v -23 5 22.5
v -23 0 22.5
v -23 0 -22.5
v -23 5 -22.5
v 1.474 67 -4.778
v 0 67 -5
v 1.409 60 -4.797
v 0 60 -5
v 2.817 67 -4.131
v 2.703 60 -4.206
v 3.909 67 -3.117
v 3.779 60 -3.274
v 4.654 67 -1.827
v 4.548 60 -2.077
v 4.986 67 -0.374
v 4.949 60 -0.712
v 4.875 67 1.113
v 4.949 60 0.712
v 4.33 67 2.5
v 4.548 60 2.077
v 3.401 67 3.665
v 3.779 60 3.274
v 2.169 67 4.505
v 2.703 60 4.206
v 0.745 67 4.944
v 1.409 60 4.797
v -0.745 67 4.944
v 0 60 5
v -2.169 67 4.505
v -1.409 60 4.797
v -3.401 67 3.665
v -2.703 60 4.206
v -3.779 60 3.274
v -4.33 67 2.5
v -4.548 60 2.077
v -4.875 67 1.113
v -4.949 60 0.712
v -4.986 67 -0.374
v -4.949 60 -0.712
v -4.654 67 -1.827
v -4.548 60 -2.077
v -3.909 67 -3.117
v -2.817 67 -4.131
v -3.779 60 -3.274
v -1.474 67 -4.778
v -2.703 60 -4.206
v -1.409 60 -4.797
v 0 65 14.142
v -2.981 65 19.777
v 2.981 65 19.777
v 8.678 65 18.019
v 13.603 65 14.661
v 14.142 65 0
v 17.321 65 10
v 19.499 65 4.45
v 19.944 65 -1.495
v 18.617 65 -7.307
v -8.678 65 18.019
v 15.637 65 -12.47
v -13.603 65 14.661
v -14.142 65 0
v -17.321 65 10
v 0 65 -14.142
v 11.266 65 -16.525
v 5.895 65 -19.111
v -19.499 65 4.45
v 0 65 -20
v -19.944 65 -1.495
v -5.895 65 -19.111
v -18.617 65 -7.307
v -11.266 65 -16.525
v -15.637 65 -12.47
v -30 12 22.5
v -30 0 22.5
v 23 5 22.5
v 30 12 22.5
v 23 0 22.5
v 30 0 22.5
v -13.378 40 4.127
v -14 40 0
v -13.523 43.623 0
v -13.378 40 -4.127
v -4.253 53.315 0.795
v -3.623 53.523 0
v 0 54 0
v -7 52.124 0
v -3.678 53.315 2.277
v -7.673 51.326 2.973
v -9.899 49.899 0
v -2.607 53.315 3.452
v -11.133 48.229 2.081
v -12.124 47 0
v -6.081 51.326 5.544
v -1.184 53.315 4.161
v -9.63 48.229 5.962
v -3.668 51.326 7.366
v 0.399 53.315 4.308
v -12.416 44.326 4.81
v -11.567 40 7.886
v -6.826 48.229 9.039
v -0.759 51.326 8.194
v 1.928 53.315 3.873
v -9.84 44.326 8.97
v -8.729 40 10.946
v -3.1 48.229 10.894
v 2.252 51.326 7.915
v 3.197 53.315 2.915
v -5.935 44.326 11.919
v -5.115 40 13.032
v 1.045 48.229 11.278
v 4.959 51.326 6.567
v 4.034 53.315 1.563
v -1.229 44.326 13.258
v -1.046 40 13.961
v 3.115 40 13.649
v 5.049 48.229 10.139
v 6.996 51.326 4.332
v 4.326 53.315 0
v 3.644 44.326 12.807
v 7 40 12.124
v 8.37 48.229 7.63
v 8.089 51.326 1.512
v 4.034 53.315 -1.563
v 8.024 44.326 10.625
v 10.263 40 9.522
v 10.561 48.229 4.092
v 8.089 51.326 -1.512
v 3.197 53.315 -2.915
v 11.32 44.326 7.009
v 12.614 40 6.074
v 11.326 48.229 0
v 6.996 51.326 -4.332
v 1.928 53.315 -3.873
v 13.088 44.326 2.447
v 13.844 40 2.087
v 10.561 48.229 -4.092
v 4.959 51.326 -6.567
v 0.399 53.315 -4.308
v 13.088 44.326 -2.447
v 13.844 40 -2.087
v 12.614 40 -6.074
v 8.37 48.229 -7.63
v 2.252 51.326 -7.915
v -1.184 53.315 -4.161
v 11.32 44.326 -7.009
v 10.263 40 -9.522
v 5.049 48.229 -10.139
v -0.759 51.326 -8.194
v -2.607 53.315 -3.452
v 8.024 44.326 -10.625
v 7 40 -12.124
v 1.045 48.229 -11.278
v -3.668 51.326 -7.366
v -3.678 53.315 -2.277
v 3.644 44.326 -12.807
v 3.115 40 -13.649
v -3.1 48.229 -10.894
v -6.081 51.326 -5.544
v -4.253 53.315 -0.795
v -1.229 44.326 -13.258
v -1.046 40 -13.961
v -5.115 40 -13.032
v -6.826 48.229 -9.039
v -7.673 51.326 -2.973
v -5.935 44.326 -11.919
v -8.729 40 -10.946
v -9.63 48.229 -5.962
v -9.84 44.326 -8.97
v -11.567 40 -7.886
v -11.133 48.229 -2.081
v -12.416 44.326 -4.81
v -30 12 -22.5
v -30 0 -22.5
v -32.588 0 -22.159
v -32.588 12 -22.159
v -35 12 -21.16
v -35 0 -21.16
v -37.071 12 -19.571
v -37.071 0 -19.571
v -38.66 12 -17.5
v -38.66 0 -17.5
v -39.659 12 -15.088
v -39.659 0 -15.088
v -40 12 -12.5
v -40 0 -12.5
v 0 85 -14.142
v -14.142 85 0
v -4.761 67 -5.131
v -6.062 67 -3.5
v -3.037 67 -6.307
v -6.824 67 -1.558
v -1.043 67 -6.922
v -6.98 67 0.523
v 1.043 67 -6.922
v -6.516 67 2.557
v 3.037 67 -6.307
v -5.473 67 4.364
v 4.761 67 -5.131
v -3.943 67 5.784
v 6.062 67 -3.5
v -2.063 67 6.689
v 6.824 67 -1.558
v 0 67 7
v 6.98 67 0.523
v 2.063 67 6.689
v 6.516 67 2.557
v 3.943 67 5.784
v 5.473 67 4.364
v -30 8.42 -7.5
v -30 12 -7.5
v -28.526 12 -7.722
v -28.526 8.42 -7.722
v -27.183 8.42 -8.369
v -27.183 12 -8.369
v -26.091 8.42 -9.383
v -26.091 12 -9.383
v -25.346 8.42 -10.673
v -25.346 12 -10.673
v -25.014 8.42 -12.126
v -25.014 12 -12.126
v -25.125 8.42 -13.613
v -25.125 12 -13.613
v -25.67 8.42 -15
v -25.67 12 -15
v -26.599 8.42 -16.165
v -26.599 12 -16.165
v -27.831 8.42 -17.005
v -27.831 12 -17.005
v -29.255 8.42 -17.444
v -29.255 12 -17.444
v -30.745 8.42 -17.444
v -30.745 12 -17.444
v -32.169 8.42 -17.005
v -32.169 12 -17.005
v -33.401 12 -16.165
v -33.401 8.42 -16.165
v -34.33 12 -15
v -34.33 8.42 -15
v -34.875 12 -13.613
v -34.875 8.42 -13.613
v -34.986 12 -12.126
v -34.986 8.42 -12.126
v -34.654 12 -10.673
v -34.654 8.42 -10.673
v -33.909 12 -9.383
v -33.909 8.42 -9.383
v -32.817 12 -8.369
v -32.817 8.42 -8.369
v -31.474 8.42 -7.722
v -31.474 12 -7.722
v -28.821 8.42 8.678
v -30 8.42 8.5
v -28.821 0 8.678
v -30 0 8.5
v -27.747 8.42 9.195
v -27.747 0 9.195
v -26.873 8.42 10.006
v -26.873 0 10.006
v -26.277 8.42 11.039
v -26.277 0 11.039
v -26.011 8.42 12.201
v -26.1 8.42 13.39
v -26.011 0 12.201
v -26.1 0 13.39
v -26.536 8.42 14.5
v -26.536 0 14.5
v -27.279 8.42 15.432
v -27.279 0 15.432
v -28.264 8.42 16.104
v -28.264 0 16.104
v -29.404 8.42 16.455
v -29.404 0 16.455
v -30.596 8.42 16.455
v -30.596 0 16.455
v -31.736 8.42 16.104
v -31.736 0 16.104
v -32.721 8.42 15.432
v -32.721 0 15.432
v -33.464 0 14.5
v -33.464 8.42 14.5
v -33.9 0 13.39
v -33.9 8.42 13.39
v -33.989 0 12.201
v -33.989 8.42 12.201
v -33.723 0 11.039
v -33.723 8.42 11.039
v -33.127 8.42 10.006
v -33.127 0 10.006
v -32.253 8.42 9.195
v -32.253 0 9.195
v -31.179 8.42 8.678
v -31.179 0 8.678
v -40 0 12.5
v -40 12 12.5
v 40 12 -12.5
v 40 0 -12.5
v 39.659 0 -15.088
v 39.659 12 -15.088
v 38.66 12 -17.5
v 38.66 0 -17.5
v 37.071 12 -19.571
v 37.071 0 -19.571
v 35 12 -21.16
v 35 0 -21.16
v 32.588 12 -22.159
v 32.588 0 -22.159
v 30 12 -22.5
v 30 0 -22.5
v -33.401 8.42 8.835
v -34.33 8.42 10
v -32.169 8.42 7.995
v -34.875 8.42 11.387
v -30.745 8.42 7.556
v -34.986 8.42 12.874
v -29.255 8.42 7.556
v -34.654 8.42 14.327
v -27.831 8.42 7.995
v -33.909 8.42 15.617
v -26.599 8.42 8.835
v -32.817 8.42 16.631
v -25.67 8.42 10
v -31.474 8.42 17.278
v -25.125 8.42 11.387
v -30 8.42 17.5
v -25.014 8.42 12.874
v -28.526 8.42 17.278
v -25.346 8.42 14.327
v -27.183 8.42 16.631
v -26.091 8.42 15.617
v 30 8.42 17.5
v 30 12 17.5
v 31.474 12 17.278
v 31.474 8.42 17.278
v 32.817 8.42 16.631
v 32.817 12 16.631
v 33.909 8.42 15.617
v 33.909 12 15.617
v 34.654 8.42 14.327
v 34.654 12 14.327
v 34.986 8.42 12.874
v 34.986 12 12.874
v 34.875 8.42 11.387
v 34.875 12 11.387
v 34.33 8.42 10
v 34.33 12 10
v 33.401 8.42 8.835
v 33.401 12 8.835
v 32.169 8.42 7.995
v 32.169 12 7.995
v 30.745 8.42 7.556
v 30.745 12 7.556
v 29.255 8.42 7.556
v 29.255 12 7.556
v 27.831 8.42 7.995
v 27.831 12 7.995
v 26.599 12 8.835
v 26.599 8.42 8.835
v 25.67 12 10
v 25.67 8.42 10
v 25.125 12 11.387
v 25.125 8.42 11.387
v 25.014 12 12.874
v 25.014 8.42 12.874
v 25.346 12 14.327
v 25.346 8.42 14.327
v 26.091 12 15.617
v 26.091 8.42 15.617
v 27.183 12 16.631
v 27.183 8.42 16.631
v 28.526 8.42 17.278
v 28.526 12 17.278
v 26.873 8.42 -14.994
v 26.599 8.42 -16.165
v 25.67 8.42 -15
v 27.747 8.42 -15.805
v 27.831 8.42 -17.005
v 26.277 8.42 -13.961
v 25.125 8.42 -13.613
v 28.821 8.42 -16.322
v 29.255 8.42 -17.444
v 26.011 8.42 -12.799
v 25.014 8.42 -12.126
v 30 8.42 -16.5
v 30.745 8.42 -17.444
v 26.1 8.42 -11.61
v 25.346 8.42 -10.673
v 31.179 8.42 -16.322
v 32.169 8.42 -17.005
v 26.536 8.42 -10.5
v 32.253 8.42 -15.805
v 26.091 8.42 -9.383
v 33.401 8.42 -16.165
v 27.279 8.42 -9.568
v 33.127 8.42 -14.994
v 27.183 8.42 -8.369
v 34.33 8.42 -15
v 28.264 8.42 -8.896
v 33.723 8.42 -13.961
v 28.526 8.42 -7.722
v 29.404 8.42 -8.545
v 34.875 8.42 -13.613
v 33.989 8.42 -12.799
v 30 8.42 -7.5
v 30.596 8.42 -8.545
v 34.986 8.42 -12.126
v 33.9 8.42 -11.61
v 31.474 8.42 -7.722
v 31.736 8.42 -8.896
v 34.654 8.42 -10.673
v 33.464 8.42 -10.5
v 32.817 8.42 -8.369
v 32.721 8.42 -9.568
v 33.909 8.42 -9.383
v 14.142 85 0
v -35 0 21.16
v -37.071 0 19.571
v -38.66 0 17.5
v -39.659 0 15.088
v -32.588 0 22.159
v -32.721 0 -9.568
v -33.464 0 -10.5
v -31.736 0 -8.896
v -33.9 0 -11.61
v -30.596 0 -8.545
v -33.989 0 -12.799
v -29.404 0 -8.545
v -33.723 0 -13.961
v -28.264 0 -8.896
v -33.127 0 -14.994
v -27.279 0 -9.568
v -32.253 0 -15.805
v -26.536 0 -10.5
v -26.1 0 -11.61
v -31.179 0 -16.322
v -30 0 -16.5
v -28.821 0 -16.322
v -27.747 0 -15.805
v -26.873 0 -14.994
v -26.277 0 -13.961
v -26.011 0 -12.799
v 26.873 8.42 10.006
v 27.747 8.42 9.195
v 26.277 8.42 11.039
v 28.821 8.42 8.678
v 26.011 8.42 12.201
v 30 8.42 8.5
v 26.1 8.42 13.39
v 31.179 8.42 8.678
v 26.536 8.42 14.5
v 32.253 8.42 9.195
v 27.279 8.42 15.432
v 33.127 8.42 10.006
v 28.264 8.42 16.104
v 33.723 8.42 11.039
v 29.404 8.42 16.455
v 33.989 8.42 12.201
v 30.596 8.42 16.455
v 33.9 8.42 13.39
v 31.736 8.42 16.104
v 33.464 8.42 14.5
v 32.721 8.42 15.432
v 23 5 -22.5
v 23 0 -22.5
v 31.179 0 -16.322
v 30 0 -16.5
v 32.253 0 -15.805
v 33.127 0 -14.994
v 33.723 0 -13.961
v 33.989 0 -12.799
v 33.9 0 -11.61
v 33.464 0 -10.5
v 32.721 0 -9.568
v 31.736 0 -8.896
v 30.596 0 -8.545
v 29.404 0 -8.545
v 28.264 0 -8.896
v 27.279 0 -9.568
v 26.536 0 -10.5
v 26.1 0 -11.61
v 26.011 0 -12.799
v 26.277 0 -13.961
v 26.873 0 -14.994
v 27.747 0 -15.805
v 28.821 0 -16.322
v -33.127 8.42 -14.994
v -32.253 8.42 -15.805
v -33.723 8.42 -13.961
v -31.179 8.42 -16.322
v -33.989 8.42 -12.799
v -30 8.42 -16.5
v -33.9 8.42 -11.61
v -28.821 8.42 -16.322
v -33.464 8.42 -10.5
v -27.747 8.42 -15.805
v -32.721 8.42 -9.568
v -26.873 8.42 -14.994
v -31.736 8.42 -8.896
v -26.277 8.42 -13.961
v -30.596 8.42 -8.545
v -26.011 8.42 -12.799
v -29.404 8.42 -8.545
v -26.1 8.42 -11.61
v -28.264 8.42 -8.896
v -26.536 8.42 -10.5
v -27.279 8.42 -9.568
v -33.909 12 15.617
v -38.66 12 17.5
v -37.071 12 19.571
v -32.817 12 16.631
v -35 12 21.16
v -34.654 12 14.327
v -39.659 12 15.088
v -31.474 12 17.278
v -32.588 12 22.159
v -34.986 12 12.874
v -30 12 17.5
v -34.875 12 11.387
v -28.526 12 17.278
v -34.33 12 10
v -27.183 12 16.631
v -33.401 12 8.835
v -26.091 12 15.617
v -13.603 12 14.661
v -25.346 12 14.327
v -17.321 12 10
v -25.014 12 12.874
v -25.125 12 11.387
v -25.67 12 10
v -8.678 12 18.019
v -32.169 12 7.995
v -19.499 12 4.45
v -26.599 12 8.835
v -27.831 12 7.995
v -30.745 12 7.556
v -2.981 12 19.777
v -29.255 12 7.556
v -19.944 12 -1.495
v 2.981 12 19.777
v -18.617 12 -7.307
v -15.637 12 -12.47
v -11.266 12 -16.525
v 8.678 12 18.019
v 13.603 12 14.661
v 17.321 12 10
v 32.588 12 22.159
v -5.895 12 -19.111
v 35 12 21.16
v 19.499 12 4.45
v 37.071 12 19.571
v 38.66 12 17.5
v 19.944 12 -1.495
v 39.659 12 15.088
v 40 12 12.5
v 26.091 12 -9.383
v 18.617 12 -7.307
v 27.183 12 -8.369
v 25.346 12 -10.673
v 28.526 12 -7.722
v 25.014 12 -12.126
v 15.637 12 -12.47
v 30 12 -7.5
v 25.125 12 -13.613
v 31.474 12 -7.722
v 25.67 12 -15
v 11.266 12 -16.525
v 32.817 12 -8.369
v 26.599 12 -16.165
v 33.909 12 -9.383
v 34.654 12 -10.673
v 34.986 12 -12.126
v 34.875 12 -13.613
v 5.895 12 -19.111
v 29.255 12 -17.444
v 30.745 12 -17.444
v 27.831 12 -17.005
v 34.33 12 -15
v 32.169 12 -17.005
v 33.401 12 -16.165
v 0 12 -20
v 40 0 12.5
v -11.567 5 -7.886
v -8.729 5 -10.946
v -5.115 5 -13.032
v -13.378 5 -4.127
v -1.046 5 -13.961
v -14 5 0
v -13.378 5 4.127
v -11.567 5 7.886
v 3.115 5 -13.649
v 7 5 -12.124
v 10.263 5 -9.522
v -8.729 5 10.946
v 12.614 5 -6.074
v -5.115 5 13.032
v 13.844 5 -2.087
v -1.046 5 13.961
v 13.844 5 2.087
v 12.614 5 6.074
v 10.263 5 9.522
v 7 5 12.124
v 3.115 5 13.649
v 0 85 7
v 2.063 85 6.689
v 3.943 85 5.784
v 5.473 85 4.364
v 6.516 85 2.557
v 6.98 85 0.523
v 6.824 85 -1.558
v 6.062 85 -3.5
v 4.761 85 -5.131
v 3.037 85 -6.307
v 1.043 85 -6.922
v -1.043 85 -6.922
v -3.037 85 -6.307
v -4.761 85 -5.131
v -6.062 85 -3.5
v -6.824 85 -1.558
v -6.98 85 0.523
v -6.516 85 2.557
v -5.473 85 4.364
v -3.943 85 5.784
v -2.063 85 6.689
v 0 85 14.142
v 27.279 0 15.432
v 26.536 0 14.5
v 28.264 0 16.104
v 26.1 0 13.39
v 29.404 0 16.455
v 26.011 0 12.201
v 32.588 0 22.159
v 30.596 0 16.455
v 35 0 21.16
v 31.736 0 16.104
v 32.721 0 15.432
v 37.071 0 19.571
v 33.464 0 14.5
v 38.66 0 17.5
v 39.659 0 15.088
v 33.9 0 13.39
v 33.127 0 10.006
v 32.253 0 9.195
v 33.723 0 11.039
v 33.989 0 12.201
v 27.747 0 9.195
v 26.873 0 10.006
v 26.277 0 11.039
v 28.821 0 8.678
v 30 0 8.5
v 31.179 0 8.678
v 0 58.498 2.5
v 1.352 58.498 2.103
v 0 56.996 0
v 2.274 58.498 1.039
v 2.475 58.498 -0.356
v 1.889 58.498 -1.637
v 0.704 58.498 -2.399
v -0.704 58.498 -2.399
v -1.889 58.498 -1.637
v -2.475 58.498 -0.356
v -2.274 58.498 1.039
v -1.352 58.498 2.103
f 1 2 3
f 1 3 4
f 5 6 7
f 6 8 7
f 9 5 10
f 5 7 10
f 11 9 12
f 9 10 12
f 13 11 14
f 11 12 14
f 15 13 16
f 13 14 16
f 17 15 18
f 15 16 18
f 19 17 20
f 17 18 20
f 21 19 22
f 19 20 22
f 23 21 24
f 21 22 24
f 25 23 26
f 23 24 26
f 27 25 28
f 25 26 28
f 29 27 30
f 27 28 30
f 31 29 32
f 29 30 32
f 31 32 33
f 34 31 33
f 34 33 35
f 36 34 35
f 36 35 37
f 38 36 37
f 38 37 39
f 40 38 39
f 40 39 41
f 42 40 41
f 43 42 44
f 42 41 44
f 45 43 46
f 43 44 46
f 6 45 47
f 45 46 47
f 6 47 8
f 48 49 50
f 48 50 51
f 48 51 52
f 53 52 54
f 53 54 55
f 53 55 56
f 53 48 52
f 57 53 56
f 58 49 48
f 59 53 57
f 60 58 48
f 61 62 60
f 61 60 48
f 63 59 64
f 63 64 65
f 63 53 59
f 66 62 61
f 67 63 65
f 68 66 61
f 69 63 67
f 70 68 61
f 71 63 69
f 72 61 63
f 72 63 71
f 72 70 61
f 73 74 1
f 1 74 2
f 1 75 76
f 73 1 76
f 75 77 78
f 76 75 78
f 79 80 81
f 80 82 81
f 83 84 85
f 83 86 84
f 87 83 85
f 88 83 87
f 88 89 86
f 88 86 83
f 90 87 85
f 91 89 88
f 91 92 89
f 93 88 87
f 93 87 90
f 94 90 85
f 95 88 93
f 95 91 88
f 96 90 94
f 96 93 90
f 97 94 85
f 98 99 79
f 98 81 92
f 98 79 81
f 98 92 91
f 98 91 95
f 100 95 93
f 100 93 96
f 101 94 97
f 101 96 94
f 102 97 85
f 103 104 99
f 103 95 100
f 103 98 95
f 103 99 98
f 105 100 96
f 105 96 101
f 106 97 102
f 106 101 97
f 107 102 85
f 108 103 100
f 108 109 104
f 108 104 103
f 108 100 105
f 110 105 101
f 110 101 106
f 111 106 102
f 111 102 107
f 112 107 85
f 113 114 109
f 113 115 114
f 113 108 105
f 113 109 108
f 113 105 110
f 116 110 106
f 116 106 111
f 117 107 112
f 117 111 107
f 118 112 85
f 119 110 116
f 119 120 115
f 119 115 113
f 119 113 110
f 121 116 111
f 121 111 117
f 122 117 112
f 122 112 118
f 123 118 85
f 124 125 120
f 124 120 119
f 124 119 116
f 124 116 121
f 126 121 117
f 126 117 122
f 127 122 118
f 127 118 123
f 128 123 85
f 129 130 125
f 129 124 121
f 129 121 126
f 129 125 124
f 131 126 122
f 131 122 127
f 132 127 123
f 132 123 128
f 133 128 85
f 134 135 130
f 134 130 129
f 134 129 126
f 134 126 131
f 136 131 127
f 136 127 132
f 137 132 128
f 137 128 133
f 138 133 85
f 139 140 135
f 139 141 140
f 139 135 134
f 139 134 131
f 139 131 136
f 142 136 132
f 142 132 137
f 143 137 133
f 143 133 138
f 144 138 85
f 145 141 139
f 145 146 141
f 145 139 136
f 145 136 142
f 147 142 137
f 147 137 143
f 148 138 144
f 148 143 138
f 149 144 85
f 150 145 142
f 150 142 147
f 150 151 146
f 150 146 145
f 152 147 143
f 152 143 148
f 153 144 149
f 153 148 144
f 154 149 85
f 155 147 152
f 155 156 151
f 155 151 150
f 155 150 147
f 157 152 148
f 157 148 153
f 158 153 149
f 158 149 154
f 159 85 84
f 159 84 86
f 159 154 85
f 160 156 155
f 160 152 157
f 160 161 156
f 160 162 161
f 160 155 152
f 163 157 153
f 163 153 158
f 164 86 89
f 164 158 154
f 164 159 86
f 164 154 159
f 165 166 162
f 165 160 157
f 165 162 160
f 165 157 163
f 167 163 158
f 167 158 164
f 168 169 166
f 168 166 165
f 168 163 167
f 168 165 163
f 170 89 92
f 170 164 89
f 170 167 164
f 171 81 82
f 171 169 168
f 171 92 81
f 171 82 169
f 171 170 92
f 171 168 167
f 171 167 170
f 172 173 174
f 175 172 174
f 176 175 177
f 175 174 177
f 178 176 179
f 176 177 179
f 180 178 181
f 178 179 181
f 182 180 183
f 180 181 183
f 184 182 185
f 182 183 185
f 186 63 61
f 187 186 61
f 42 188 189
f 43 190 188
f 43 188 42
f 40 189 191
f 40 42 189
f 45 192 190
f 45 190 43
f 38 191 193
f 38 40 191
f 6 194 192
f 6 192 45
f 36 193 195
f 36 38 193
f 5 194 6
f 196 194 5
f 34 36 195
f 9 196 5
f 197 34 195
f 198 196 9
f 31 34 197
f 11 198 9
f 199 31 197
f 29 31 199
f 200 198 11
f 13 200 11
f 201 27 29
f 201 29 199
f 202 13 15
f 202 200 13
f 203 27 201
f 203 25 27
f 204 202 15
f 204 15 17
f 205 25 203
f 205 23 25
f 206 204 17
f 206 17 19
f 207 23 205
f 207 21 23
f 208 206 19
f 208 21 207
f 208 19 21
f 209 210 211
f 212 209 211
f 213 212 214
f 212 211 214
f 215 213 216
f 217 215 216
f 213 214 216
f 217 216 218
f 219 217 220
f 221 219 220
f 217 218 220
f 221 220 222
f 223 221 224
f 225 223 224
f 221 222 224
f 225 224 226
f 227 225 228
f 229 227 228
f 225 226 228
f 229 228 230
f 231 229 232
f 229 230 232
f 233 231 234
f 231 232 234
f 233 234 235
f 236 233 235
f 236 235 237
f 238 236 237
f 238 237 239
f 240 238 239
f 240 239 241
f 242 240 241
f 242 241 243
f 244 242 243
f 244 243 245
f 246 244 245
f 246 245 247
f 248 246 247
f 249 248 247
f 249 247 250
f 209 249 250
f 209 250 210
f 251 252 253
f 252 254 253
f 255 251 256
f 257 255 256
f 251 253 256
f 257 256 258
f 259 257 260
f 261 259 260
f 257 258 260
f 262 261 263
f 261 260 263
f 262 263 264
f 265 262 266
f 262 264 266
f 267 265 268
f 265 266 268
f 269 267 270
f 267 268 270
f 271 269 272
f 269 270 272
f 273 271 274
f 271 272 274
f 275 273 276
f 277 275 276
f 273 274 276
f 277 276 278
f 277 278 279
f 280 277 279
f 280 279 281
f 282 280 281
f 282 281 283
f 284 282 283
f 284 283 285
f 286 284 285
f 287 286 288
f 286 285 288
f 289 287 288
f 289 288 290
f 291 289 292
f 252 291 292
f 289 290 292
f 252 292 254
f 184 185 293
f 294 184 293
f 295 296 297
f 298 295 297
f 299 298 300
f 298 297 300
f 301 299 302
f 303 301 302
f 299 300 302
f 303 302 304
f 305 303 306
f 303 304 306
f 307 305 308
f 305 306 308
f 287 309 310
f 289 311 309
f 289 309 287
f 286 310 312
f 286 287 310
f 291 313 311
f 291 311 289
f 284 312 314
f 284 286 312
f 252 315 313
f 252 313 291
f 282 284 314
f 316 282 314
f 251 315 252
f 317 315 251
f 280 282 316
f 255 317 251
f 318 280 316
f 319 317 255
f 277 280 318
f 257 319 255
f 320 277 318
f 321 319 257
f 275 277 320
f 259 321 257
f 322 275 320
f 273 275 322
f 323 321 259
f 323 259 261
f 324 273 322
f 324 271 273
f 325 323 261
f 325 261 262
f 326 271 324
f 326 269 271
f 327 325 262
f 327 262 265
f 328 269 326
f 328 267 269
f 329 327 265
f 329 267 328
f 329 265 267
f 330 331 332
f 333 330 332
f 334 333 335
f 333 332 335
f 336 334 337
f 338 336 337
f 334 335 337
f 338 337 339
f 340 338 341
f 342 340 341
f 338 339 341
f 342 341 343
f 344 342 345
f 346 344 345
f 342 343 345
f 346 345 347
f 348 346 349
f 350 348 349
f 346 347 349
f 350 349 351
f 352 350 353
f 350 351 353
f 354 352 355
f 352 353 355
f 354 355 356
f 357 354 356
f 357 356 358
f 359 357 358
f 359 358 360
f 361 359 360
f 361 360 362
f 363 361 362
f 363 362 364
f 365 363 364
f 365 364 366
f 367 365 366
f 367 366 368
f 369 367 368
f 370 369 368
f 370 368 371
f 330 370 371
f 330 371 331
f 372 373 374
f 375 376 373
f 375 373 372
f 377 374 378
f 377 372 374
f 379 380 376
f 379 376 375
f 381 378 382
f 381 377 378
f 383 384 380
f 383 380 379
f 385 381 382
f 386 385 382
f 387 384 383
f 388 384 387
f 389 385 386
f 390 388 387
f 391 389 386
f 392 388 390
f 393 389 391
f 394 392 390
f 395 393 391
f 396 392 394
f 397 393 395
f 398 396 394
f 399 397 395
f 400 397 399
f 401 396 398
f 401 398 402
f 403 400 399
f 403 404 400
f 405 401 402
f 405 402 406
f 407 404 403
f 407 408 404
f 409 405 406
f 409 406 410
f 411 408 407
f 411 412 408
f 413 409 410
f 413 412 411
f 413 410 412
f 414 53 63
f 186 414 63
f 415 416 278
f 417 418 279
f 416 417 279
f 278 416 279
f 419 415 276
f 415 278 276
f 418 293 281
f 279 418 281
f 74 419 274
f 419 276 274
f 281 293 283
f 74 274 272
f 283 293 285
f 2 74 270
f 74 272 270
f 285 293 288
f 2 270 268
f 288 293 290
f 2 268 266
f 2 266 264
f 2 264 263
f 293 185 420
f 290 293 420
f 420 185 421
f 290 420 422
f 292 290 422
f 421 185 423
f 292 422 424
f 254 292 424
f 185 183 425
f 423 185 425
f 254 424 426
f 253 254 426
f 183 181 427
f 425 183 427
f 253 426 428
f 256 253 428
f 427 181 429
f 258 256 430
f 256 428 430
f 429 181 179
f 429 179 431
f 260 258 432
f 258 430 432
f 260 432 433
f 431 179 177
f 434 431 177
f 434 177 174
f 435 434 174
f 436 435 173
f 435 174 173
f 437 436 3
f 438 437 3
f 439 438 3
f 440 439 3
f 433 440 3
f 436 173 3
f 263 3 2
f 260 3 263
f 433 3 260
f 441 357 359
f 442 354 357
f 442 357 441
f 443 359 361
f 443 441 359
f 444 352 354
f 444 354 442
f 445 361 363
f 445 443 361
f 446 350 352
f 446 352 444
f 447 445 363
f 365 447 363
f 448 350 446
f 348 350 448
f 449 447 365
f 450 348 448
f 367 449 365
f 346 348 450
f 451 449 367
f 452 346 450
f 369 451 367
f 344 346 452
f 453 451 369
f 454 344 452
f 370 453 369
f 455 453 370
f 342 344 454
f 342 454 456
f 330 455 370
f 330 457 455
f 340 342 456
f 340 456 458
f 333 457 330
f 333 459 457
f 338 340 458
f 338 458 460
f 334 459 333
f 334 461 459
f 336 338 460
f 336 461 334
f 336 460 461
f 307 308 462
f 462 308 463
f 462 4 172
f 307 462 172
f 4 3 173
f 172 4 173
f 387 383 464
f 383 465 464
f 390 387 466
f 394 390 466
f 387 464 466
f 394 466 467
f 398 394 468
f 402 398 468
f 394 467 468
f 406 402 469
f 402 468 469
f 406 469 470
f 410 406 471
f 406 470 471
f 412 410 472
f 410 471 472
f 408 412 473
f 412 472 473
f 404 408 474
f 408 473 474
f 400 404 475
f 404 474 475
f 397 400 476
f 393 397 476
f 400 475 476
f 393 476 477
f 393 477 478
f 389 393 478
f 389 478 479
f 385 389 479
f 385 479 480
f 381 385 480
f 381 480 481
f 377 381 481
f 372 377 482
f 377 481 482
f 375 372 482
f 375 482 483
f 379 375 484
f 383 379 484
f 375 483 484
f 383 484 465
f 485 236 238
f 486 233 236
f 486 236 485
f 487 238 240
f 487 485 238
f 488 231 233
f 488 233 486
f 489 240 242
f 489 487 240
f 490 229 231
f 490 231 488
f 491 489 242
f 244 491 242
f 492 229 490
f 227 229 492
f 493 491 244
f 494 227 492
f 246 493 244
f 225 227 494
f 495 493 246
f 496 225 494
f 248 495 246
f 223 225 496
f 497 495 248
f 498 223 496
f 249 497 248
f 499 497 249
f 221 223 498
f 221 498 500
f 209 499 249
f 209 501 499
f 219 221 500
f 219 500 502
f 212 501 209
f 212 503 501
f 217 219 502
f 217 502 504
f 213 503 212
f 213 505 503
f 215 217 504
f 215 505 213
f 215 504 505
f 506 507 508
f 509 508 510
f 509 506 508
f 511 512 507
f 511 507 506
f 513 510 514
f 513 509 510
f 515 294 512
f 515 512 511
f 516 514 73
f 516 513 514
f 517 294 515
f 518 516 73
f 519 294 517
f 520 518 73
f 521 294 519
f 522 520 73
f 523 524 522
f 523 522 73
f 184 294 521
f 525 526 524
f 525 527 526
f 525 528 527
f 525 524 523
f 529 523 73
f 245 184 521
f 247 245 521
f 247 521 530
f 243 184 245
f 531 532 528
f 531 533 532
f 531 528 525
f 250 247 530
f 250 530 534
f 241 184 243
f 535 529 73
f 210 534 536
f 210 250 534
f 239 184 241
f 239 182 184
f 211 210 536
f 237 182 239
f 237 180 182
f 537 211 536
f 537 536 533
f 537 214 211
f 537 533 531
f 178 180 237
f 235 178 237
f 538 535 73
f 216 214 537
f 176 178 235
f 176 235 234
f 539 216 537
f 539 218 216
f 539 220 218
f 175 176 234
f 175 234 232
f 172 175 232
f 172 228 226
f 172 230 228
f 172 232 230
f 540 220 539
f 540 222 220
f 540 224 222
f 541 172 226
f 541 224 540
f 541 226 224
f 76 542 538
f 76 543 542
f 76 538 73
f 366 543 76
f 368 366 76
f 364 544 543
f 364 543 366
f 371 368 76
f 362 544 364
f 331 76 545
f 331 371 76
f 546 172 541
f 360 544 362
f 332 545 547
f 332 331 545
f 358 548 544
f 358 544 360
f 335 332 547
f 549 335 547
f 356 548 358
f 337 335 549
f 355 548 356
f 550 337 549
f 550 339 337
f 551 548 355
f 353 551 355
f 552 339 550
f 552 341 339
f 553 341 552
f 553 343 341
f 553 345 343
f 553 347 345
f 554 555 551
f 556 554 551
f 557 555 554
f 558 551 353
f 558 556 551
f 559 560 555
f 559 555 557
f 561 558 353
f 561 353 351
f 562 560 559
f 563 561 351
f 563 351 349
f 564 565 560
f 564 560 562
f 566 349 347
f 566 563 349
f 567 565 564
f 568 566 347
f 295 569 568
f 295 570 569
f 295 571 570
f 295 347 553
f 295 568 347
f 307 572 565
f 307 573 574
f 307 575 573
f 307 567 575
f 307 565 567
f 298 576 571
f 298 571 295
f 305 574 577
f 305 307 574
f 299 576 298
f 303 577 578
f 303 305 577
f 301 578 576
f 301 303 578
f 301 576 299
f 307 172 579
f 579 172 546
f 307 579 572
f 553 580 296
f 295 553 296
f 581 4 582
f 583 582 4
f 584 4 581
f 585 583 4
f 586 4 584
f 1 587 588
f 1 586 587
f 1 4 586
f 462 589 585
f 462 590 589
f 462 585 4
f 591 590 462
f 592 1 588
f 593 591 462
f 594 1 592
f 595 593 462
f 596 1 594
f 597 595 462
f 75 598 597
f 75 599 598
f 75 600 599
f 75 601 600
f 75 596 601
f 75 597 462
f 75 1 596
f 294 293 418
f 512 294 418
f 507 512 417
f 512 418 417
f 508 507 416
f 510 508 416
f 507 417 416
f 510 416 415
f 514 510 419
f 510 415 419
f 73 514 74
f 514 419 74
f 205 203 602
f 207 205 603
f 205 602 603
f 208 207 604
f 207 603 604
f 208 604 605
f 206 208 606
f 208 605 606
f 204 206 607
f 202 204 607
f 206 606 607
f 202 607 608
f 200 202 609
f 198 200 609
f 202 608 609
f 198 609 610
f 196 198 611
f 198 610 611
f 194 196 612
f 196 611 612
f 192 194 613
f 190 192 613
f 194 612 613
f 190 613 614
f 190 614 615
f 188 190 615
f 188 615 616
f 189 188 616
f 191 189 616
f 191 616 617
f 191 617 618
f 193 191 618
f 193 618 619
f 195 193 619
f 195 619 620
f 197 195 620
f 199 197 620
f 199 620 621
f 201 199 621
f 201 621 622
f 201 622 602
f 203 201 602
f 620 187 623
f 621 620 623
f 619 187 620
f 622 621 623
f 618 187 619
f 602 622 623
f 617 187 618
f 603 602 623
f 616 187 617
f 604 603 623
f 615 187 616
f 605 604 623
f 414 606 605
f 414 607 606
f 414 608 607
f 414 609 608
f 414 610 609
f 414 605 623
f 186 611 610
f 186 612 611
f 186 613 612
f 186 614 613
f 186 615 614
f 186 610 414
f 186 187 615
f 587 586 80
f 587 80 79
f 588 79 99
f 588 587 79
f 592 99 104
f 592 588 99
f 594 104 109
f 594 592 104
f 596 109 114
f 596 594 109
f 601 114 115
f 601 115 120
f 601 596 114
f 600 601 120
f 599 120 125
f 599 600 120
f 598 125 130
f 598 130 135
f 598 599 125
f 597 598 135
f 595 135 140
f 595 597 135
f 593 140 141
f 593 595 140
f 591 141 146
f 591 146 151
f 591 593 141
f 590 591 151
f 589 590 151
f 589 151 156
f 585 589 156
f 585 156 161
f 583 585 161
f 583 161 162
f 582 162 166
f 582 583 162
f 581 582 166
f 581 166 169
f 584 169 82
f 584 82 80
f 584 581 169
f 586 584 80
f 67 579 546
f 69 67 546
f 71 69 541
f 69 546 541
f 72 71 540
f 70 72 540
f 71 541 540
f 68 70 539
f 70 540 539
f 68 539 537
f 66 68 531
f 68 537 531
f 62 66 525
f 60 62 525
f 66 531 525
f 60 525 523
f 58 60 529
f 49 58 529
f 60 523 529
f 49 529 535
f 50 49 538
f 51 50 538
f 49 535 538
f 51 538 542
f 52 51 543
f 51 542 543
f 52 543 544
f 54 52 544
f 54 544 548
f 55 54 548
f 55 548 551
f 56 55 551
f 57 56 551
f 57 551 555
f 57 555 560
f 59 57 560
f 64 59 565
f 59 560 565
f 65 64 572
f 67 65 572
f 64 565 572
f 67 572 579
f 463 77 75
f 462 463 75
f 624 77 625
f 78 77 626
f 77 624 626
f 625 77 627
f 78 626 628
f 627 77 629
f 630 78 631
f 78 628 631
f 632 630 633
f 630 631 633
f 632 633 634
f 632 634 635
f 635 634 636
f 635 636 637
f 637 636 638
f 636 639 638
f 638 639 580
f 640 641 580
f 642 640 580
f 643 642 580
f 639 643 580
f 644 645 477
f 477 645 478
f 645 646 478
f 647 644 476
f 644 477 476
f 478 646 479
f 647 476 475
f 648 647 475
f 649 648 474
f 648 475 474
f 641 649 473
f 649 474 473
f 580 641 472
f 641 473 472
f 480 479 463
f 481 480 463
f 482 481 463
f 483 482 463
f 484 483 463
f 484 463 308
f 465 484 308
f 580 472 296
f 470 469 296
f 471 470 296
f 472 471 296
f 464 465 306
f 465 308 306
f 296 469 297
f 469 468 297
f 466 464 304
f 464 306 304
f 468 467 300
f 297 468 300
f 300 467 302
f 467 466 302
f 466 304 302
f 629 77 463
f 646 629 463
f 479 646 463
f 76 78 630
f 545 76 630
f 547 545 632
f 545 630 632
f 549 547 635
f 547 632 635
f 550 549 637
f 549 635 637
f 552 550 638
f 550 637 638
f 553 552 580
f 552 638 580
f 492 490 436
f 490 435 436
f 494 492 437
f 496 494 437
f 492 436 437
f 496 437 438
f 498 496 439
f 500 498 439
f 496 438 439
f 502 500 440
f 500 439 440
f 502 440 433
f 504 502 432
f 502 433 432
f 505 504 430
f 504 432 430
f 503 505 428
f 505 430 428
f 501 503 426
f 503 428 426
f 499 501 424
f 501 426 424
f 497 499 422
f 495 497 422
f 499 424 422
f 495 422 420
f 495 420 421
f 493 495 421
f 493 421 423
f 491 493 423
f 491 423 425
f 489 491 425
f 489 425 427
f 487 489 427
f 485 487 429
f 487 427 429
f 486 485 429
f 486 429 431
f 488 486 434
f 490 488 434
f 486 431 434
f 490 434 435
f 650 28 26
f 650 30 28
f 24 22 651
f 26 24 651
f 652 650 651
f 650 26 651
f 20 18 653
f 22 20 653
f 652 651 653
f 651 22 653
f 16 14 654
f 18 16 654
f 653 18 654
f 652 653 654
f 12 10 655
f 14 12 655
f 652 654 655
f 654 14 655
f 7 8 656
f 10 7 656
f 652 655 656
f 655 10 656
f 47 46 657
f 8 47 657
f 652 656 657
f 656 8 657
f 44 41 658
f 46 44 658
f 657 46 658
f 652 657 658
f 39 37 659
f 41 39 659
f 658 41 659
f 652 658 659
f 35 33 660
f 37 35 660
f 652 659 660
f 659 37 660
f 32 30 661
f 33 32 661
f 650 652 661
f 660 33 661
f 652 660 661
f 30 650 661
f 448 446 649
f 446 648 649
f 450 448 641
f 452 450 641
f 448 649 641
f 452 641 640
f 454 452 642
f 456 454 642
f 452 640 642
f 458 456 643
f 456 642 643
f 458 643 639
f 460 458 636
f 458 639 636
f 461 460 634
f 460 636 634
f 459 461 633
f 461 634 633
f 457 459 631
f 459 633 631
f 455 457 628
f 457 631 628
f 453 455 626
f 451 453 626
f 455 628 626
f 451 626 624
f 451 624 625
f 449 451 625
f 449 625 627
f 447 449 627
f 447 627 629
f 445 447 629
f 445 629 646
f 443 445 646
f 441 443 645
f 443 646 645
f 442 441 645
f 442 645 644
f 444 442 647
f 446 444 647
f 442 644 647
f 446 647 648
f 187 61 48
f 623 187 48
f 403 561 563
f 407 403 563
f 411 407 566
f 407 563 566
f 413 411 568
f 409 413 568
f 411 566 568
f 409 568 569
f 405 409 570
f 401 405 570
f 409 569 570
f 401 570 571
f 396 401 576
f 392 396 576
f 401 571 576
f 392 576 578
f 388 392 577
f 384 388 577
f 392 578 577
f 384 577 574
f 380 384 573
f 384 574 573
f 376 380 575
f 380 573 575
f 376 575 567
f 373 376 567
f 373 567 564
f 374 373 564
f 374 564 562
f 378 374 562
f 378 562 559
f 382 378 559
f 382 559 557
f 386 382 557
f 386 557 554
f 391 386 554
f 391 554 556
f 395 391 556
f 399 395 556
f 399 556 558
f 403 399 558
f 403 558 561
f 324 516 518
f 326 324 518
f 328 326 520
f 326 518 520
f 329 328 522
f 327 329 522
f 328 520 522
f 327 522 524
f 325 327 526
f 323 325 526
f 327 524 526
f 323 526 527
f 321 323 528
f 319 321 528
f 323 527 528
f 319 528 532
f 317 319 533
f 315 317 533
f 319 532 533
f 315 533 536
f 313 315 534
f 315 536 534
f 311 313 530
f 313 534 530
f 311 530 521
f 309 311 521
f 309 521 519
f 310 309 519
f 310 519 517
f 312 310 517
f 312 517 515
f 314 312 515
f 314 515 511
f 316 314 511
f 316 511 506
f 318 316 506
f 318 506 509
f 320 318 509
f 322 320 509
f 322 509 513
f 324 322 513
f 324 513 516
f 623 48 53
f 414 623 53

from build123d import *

# Parameters (mm, degrees)
BOSS_EXTRUDE1_DEPTH                     = 12
CBORE_FOR_M5_HEX_HEAD_BOLT1_D           = 8
CBORE_FOR_M5_HEX_HEAD_BOLT1_CBORE_D     = 10
CBORE_FOR_M5_HEX_HEAD_BOLT1_CBORE_DEPTH = 3.58
SKETCH4_R                               = 20
BOSS_EXTRUDE2_DEPTH                     = 53
BOSS_EXTRUDE3_DEPTH                     = 20
CBORE_FOR_M5_HEX_HEAD_BOLT5_D           = 10
CBORE_FOR_M5_HEX_HEAD_BOLT5_DEPTH       = 25
CBORE_FOR_M5_HEX_HEAD_BOLT5_CBORE_D     = 14
CBORE_FOR_M5_HEX_HEAD_BOLT5_CBORE_DEPTH = 18
CBORE_FOR_M5_HEX_HEAD_BOLT5_TIP         = 3.004303095
SKETCH11_W                              = 46
SKETCH11_H                              = 10
CUT_EXTRUDE1_DEPTH                      = 105.16333328


with BuildPart() as part:
    # Sketch2 → Boss-Extrude1 (new body)
    with BuildSketch(Plane(origin=(0, 0, 0), x_dir=(1, 0, 0), z_dir=(0, 1, 0))):
        with BuildLine():
            Line((-30, -22.5), (30, -22.5))
            ThreePointArc((30, -22.5), (37.071067812, -19.571067812), (40, -12.5))
            Line((40, -12.5), (40, 12.5))
            ThreePointArc((40, 12.5), (37.071067812, 19.571067812), (30, 22.5))
            Line((30, 22.5), (-30, 22.5))
            ThreePointArc((-30, 22.5), (-37.071067812, 19.571067812), (-40, 12.5))
            Line((-40, 12.5), (-40, -12.5))
            ThreePointArc((-40, -12.5), (-37.071067812, -19.571067812), (-30, -22.5))
        make_face()
    extrude(amount=BOSS_EXTRUDE1_DEPTH)

    # CBORE for M5 Hex Head Bolt1 (through all)
    with Locations(Plane(origin=(-30, 12, 12.5), x_dir=(0, 0, 1), z_dir=(0, 1, 0))):
        with Locations((0, 0), (-25, 0), (-25, 60), (0, 60)):
            CounterBoreHole(CBORE_FOR_M5_HEX_HEAD_BOLT1_D / 2, CBORE_FOR_M5_HEX_HEAD_BOLT1_CBORE_D / 2, CBORE_FOR_M5_HEX_HEAD_BOLT1_CBORE_DEPTH)

    # Sketch4 → Boss-Extrude2 (add)
    with BuildSketch(Plane(origin=(0, 12, 0), x_dir=(1, 0, 0), z_dir=(0, 1, 0))):
        with Locations(Location((0, 0, 0), (0, 0, 90))):
            Circle(SKETCH4_R)
    extrude(amount=BOSS_EXTRUDE2_DEPTH)

    # Sketch5 → Boss-Extrude3 (add)
    with BuildSketch(Plane(origin=(0, 65, 0), x_dir=(1, 0, 0), z_dir=(0, 1, 0))):
        Polygon((0, -14.142135624), (14.142135624, 0), (0, 14.142135624), (-14.142135624, 0), align=None)
    extrude(amount=BOSS_EXTRUDE3_DEPTH)

    # CBORE for M5 Hex Head Bolt5
    with Locations(Plane.ZX.offset(85)):
        with Locations((0, 0)):
            CounterBoreHole(CBORE_FOR_M5_HEX_HEAD_BOLT5_D / 2, CBORE_FOR_M5_HEX_HEAD_BOLT5_CBORE_D / 2, CBORE_FOR_M5_HEX_HEAD_BOLT5_CBORE_DEPTH, depth=CBORE_FOR_M5_HEX_HEAD_BOLT5_DEPTH)
            with Locations((0, 0, -(CBORE_FOR_M5_HEX_HEAD_BOLT5_DEPTH + CBORE_FOR_M5_HEX_HEAD_BOLT5_TIP / 2))):  # 118° drill point
                Cone(0, CBORE_FOR_M5_HEX_HEAD_BOLT5_D / 2, CBORE_FOR_M5_HEX_HEAD_BOLT5_TIP, mode=Mode.SUBTRACT)

    # Sketch10 → Cut-Revolve1 (revolve, cut)
    with BuildSketch(Plane.XY):
        with BuildLine():
            Line((0, 0), (0, 54))
            ThreePointArc((0, 54), (-9.899494937, 49.899494937), (-14, 40))
            Line((-14, 40), (-14, 0))
            Line((-14, 0), (0, 0))
        make_face()
    revolve(axis=Axis((0, 0, 0), (0, 1, 0)), mode=Mode.SUBTRACT)

    # Sketch11 → Cut-Extrude1 (cut, through all)
    with BuildSketch(Plane.XY.offset(22.5)):
        Rectangle(SKETCH11_W, SKETCH11_H)
    extrude(amount=-CUT_EXTRUDE1_DEPTH, mode=Mode.SUBTRACT)


solid = part.part
